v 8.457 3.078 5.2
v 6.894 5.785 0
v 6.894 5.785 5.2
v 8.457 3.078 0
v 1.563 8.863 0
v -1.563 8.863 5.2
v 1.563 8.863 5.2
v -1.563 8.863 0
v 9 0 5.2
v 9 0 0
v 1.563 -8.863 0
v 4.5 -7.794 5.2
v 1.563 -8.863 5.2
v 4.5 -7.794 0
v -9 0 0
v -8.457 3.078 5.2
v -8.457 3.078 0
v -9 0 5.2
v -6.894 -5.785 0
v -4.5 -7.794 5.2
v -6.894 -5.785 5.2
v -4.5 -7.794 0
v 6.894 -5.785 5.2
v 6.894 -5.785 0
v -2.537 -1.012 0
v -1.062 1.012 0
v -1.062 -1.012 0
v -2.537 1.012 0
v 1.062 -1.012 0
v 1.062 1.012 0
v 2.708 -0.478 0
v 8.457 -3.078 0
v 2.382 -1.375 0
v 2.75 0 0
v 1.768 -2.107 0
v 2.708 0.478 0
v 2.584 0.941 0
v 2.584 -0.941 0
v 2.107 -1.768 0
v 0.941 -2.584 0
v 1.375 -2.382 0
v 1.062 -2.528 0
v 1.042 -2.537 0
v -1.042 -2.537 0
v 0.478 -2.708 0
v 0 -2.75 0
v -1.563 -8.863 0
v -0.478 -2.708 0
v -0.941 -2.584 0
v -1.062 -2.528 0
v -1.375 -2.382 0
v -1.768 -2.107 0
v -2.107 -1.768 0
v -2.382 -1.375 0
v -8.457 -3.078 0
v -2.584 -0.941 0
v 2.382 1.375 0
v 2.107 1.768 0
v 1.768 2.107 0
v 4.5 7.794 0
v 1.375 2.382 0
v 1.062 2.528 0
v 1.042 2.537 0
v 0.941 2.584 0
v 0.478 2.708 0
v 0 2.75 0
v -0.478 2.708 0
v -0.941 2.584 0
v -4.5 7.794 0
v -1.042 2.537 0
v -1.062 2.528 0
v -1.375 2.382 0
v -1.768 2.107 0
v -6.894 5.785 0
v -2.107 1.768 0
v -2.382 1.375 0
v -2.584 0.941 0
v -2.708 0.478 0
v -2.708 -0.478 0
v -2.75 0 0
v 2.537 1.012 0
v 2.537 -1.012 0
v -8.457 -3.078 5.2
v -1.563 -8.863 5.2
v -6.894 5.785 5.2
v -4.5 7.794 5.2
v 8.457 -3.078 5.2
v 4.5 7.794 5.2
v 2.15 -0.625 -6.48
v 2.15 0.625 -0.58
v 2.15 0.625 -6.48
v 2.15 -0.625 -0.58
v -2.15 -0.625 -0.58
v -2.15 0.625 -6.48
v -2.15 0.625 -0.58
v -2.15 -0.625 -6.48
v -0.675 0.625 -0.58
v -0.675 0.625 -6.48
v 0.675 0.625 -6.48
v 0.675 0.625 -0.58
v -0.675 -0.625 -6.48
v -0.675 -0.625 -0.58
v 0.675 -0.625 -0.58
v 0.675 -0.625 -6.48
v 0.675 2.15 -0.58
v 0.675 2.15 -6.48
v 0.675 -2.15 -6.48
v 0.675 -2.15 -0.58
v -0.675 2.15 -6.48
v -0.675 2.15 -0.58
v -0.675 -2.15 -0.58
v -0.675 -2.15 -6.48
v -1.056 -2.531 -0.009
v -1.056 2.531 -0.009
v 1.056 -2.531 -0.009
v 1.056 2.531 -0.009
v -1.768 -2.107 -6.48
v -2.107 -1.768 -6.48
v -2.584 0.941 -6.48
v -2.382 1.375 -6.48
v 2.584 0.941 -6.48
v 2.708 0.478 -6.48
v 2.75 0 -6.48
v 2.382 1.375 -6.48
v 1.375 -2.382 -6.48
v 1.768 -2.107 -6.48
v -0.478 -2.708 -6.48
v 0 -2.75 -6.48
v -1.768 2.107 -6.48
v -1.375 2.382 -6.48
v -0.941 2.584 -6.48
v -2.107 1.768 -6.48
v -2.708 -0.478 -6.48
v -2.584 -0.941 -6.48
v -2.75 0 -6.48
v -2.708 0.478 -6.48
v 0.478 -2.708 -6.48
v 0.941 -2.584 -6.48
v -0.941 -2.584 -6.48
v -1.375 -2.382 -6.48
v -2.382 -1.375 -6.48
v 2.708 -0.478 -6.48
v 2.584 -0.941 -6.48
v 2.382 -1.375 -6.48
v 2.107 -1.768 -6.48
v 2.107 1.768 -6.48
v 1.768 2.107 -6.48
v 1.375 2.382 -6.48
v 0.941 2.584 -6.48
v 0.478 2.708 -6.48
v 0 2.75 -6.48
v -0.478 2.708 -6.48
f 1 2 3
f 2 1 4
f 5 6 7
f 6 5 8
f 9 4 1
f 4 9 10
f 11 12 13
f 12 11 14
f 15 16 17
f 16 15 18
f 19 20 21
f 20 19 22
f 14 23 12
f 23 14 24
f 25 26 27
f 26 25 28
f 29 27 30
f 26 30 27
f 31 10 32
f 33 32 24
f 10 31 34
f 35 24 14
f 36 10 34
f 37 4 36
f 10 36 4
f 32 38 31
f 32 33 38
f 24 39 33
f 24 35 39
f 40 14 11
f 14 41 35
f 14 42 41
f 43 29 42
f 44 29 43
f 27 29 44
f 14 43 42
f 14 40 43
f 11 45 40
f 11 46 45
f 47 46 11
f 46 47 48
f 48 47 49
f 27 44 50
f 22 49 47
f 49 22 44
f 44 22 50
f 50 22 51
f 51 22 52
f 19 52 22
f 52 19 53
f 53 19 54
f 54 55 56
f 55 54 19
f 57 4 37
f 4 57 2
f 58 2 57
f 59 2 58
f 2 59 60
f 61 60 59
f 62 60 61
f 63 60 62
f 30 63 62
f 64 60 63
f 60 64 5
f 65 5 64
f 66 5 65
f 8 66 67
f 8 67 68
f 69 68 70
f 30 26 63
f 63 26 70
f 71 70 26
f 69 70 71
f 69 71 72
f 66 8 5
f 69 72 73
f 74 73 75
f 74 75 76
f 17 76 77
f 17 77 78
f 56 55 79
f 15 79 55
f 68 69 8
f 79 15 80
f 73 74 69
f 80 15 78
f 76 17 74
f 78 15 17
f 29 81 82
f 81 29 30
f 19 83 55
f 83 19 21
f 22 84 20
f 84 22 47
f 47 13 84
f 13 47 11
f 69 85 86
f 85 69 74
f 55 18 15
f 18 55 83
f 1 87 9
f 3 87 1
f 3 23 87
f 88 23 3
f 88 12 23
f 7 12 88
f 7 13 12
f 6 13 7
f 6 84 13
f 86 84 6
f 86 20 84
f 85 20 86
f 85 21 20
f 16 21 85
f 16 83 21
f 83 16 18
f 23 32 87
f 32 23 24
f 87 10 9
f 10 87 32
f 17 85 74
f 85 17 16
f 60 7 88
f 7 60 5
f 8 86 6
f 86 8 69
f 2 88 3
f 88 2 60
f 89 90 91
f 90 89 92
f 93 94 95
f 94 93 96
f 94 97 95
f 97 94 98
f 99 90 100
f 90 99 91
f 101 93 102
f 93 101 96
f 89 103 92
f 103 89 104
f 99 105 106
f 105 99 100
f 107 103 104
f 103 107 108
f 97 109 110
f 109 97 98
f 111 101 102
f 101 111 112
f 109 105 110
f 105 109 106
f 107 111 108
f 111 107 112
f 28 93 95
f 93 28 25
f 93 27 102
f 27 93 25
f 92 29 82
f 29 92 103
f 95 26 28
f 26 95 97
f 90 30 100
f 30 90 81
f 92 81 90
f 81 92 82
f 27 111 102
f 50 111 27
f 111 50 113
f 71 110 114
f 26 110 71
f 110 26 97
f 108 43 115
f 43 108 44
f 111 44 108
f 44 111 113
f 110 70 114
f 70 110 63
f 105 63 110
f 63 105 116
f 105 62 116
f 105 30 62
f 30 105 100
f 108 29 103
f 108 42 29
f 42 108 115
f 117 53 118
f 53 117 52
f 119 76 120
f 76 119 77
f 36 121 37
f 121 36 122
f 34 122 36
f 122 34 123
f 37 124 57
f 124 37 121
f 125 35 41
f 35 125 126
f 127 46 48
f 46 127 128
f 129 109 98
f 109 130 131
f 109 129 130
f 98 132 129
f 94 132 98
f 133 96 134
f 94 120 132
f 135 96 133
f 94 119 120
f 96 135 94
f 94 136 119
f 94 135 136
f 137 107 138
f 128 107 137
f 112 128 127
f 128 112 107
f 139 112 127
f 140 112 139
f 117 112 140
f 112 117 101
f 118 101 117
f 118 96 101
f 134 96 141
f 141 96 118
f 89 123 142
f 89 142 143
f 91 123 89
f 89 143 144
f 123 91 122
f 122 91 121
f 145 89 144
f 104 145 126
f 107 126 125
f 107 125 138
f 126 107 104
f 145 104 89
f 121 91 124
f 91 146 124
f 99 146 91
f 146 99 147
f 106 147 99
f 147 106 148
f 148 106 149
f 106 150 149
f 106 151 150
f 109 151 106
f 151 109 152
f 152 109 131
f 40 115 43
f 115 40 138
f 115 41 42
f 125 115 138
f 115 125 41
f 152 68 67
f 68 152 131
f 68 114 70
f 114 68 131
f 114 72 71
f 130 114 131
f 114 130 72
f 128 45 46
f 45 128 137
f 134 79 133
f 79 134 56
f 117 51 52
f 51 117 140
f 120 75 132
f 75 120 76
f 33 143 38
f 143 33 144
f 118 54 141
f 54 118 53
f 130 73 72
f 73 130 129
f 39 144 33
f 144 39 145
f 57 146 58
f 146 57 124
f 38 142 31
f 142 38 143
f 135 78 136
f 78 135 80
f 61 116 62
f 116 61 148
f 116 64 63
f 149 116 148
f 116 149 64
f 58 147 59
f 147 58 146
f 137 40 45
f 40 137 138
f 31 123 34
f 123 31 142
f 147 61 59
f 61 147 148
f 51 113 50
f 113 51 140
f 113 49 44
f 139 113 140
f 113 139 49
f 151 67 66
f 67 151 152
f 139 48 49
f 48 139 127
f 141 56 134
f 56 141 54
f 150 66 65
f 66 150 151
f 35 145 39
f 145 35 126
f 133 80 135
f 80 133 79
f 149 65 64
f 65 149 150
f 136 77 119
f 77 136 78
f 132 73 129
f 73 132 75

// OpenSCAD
// file: ../modules/homing_bar.scad
function homing_bar_quality_steps(quality, preview_steps, export_steps) =
    quality == "preview" ? preview_steps : export_steps;

module homing_bar_profile(length, width, quality = "export") {
    end_steps = homing_bar_quality_steps(quality, 18, 32);
    cap_length = max(length, width);

    hull() {
        translate([-cap_length / 2 + width / 2, 0])
            circle(d = width, $fn = end_steps);
        translate([ cap_length / 2 - width / 2, 0])
            circle(d = width, $fn = end_steps);
    }
}

module homing_bar_blank(
    length,
    width,
    height,
    base_thickness,
    offset_y,
    base_z,
    quality = "export"
) {
    cap_height = max(height, 0.05);
    contact_height = max(base_thickness, 0.05);
    contact_length = length + contact_height * 1.6;
    contact_width = width + contact_height * 1.2;

    translate([0, offset_y, base_z])
        union() {
            hull() {
                linear_extrude(height = 0.01)
                    homing_bar_profile(contact_length, contact_width, quality);
                translate([0, 0, contact_height])
                    linear_extrude(height = 0.01)
                        homing_bar_profile(length, width, quality);
            }

            translate([0, 0, contact_height])
                linear_extrude(height = cap_height)
                    homing_bar_profile(length, width, quality);
        }
}
// file: ../modules/stem_alps.scad
function positive_alps_stem_dimension(value, minimum = 0.1) = max(value, minimum);

module alps_post(stem_length, stem_width, stem_height, lead_in) {
    safe_length = positive_alps_stem_dimension(stem_length);
    safe_width = positive_alps_stem_dimension(stem_width);
    safe_height = max(stem_height, 0.2);
    safe_lead_in = min(lead_in, safe_length * 0.2, safe_width * 0.3, safe_height * 0.4);

    hull() {
        linear_extrude(height = max(safe_height - safe_lead_in, 0.01))
            square([safe_length, safe_width], center = true);

        translate([0, 0, safe_height - 0.01])
            linear_extrude(height = 0.01)
                square([
                    positive_alps_stem_dimension(safe_length - safe_lead_in * 2),
                    positive_alps_stem_dimension(safe_width - safe_lead_in * 2)
                ], center = true);
    }
}

module stem_alps(
    stem_length = 4.45,
    stem_width = 2.25,
    stem_height = 3.5,
    base_clearance = 0,
    lead_in = 0.12,
    quality = "export"
) {
    translate([0, 0, base_clearance])
        alps_post(stem_length, stem_width, stem_height, lead_in);
}
// file: ../modules/stem_choc_v2.scad
use <stem_mx.scad>

module stem_choc_v2(
    outer_diameter = 5.5,
    stem_height = 6.5,
    base_clearance = 0,
    cross_width_horizontal = 1.25,
    cross_length_horizontal = 4.3,
    cross_width_vertical = 1.35,
    cross_length_vertical = 4.3,
    cross_chamfer = 0.4,
    chamfer_height = 0.6,
    quality = "export"
) {
    stem_mx(
        outer_diameter = outer_diameter,
        stem_height = stem_height,
        base_clearance = base_clearance,
        cross_width_horizontal = cross_width_horizontal,
        cross_length_horizontal = cross_length_horizontal,
        cross_width_vertical = cross_width_vertical,
        cross_length_vertical = cross_length_vertical,
        cross_chamfer = cross_chamfer,
        chamfer_height = chamfer_height,
        quality = quality
    );
}
// file: ../modules/stem_choc_v1.scad
function positive_choc_stem_dimension(value, minimum = 0.1) = max(value, minimum);

module choc_v1_prong(prong_width, prong_depth, prong_height, lead_in) {
    safe_width = positive_choc_stem_dimension(prong_width);
    safe_depth = positive_choc_stem_dimension(prong_depth);
    safe_height = max(prong_height, 0.2);
    safe_lead_in = min(lead_in, safe_width * 0.4, safe_depth * 0.2, safe_height * 0.4);

    hull() {
        linear_extrude(height = max(safe_height - safe_lead_in, 0.01))
            square([safe_width, safe_depth], center = true);

        translate([0, 0, safe_height - 0.01])
            linear_extrude(height = 0.01)
                square([
                    positive_choc_stem_dimension(safe_width - safe_lead_in * 2),
                    positive_choc_stem_dimension(safe_depth - safe_lead_in * 2)
                ], center = true);
    }
}

module stem_choc_v1(
    prong_width = 1.2,
    prong_depth = 3.0,
    prong_spacing = 5.7,
    stem_height = 3.0,
    base_clearance = 0,
    lead_in = 0.12,
    quality = "export"
) {
    for (offset_x = [prong_spacing / 2, -prong_spacing / 2]) {
        translate([offset_x, 0, base_clearance])
            choc_v1_prong(prong_width, prong_depth, stem_height, lead_in);
    }
}
// file: ../modules/stem_mx.scad
function stem_quality_steps(quality, preview_steps, export_steps) =
    quality == "preview" ? preview_steps : export_steps;

module stem_slot(length, width, height) {
    translate([-length / 2, -width / 2, 0])
        cube([length, width, height]);
}

module stem_mx(
    outer_diameter = 5.5,
    stem_height = 4.5,
    base_clearance = 0,
    cross_width_horizontal = 1.25,
    cross_length_horizontal = 4.3,
    cross_width_vertical = 1.35,
    cross_length_vertical = 4.3,
    cross_chamfer = 0.4,
    chamfer_height = 0.6,
    quality = "export"
) {
    outer_steps = stem_quality_steps(quality, 36, 64);
    safe_height = max(stem_height, 0.2);

    difference() {
        translate([0, 0, base_clearance])
            cylinder(d = outer_diameter, h = safe_height, $fn = outer_steps);

        translate([0, 0, base_clearance]) {
            stem_slot(cross_length_horizontal, cross_width_horizontal, safe_height + 1);
            stem_slot(cross_width_vertical, cross_length_vertical, safe_height + 1);
        }

        if (cross_chamfer > 0) {
            translate([0, 0, base_clearance - 0.01])
                hull() {
                    stem_slot(
                        cross_length_horizontal + cross_chamfer * 2,
                        cross_width_horizontal + cross_chamfer * 2,
                        0.01
                    );
                    translate([0, 0, chamfer_height])
                        stem_slot(cross_length_horizontal, cross_width_horizontal, 0.01);
                }

            translate([0, 0, base_clearance - 0.01])
                hull() {
                    stem_slot(
                        cross_width_vertical + cross_chamfer * 2,
                        cross_length_vertical + cross_chamfer * 2,
                        0.01
                    );
                    translate([0, 0, chamfer_height])
                        stem_slot(cross_width_vertical, cross_length_vertical, 0.01);
                }
        }
    }
}
// file: ../modules/legend_block.scad
function legend_quality_steps(quality, preview_steps, export_steps) =
    quality == "preview" ? preview_steps : export_steps;
function legend_text_curve_steps(quality = "export") =
    legend_quality_steps(quality, 48, 96);
function legend_text_internal_scale(quality = "export") =
    legend_quality_steps(quality, 6, 10);
// Keep legend size tied to the user's explicit control value without auto-fitting by label length.
function legend_text_size(depth) = max(depth, 0);

module legend_text_shape(label, size, font_name, curve_steps = 48) {
    text(
        text = label,
        size = size,
        font = font_name,
        halign = "center",
        valign = "center",
        $fn = curve_steps
    );
}

// Keep decoration options available across bundled fonts without requiring extra font files.
module legend_text_profile(
    label,
    size,
    font_name,
    outline_delta = 0,
    curve_steps = 48
) {
    if (abs(outline_delta) > 0.0001) {
        offset(delta = outline_delta)
            legend_text_shape(
                label = label,
                size = size,
                font_name = font_name,
                curve_steps = curve_steps
            );
    } else {
        legend_text_shape(
            label = label,
            size = size,
            font_name = font_name,
            curve_steps = curve_steps
        );
    }
}

module legend_block(
    label,
    width,
    depth,
    height,
    offset_x,
    offset_y,
    base_z,
    font_name = "M PLUS 1:style=Regular",
    underline_enabled = false,
    underline_width = 0,
    underline_thickness = 0,
    underline_offset_y = 0,
    outline_delta = 0,
    quality = "export"
) {
    if (!is_undef(label) && len(label) > 0) {
        size = legend_text_size(depth);
        curve_steps = legend_text_curve_steps(quality);
        internal_scale = legend_text_internal_scale(quality);

        translate([offset_x, offset_y, base_z])
            linear_extrude(height = height, center = false, convexity = 10)
                // Build glyph outlines at a larger internal scale so the bundled runtime
                // preserves more of the original font curvature before scaling back down.
                scale([1 / internal_scale, 1 / internal_scale, 1])
                    union() {
                        legend_text_profile(
                            label = label,
                            size = size * internal_scale,
                            font_name = font_name,
                            outline_delta = outline_delta * internal_scale,
                            curve_steps = curve_steps
                        );

                        if (underline_enabled && underline_width > 0 && underline_thickness > 0) {
                            translate([0, underline_offset_y * internal_scale])
                                square(
                                    [underline_width * internal_scale, underline_thickness * internal_scale],
                                    center = true
                                );
                        }
                    }
    }
}
// file: ../modules/keycap_typewriter.scad
use <keycap_shell.scad>

function typewriter_plan_corner_radius(width, depth, radius) =
    min(max(radius, 0), max(min(width, depth), 0.2) / 2);
function typewriter_is_axis_aligned(pitch_deg, roll_deg) =
    abs(pitch_deg) <= 0.001 && abs(roll_deg) <= 0.001;

module keycap_typewriter_plan_profile(
    width,
    depth,
    corner_radius,
    quality = "export"
) {
    rounded_rect_coords(
        -width / 2,
        width / 2,
        -depth / 2,
        depth / 2,
        typewriter_plan_corner_radius(width, depth, corner_radius),
        quality
    );
}

module keycap_typewriter_outer_shell(
    width,
    depth,
    top_center_height,
    corner_radius,
    pitch_deg = 0,
    roll_deg = 0,
    quality = "export"
) {
    safe_corner_radius = typewriter_plan_corner_radius(width, depth, corner_radius);

    hull() {
        keycap_base_face(
            -width / 2,
            width / 2,
            -depth / 2,
            depth / 2,
            safe_corner_radius,
            quality
        );

        keycap_top_face(
            -width / 2,
            width / 2,
            -depth / 2,
            depth / 2,
            safe_corner_radius,
            top_center_height,
            pitch_deg,
            roll_deg,
            quality
        );
    }
}

module keycap_typewriter_cap(
    width,
    depth,
    top_center_height,
    corner_radius = 9,
    dish_radius = 45,
    dish_depth = 0,
    pitch_deg = 0,
    roll_deg = 0,
    quality = "export"
) {
    difference() {
        if (typewriter_is_axis_aligned(pitch_deg, roll_deg)) {
            linear_extrude(height = top_center_height)
                keycap_typewriter_plan_profile(
                    width = width,
                    depth = depth,
                    corner_radius = corner_radius,
                    quality = quality
                );
        } else {
            keycap_typewriter_outer_shell(
                width = width,
                depth = depth,
                top_center_height = top_center_height,
                corner_radius = corner_radius,
                pitch_deg = pitch_deg,
                roll_deg = roll_deg,
                quality = quality
            );
        }

        keycap_dish_cut(
            top_center_height = top_center_height,
            dish_depth = dish_depth,
            dish_radius = dish_radius,
            quality = quality
        );
    }
}

module keycap_typewriter_shell(
    width,
    depth,
    top_center_height,
    wall,
    top_thickness = 1.2,
    corner_radius = 9,
    dish_radius = 45,
    dish_depth = 0,
    pitch_deg = 0,
    roll_deg = 0,
    quality = "export"
) {
    keycap_typewriter_cap(
        width = width,
        depth = depth,
        top_center_height = top_center_height,
        corner_radius = corner_radius,
        dish_radius = dish_radius,
        dish_depth = dish_depth,
        pitch_deg = pitch_deg,
        roll_deg = roll_deg,
        quality = quality
    );
}
// file: ../presets/stem-nominals.scad
stem_nominal_outer_diameter = 5.5;
legacy_stem_nominal_width = stem_nominal_outer_diameter;
legacy_stem_nominal_depth = stem_nominal_outer_diameter;
stem_nominal_height = 6.5;
stem_nominal_inset = 0;
stem_nominal_cross_width_horizontal = 1.25;
stem_nominal_cross_length_horizontal = 4.3;
stem_nominal_cross_width_vertical = 1.35;
stem_nominal_cross_length_vertical = 4.3;
stem_nominal_cross_chamfer = 0.4;

stem_mx_nominal_outer_diameter = 5.5;
stem_mx_nominal_height = 4.5;
stem_mx_nominal_inset = 0;
stem_mx_nominal_cross_width_horizontal = stem_nominal_cross_width_horizontal;
stem_mx_nominal_cross_length_horizontal = stem_nominal_cross_length_horizontal;
stem_mx_nominal_cross_width_vertical = stem_nominal_cross_width_vertical;
stem_mx_nominal_cross_length_vertical = stem_nominal_cross_length_vertical;
stem_mx_nominal_cross_chamfer = stem_nominal_cross_chamfer;

stem_choc_v2_nominal_outer_diameter = stem_nominal_outer_diameter;
stem_choc_v2_nominal_height = stem_nominal_height;
stem_choc_v2_nominal_inset = stem_nominal_inset;
stem_choc_v2_nominal_cross_width_horizontal = stem_nominal_cross_width_horizontal;
stem_choc_v2_nominal_cross_length_horizontal = stem_nominal_cross_length_horizontal;
stem_choc_v2_nominal_cross_width_vertical = stem_nominal_cross_width_vertical;
stem_choc_v2_nominal_cross_length_vertical = stem_nominal_cross_length_vertical;
stem_choc_v2_nominal_cross_chamfer = stem_nominal_cross_chamfer;

stem_choc_v1_nominal_height = 3.0;
stem_choc_v1_nominal_inset = 0;
stem_choc_v1_nominal_prong_width = 1.2;
stem_choc_v1_nominal_prong_depth = 3.0;
stem_choc_v1_nominal_prong_spacing = 5.7;
stem_choc_v1_nominal_lead_in = 0.12;

stem_alps_nominal_height = 3.5;
stem_alps_nominal_inset = 0;
stem_alps_nominal_length = 4.45;
stem_alps_nominal_width = 2.25;
stem_alps_nominal_lead_in = 0.12;
// file: common/typewriter-params.scad
user_shape_geometry_type = "typewriter";
user_key_width = 18;
user_key_depth = 18;
user_top_center_height = 5.2;
user_wall_thickness = 1.1;
user_top_scale = 1;
user_typewriter_corner_radius = 9;
user_profile_front_angle = 0;
user_profile_back_angle = 0;
user_profile_left_angle = 0;
user_profile_right_angle = 0;
user_top_thickness = 1.2;
user_bottom_corner_radius = 0;
user_top_corner_radius = 0;
user_dish_radius = 45;
user_dish_depth = 0;
user_top_pitch_deg = 0;
user_top_roll_deg = 0;

user_legend_enabled = true;
user_legend_text = "A";
user_legend_font_name = "M PLUS 1:style=Regular";
user_legend_underline_enabled = false;
user_legend_underline_width = 0;
user_legend_underline_thickness = 0;
user_legend_underline_offset_y = 0;
user_legend_width = 7.2;
user_legend_depth = 4.0;
user_legend_height = 0;
user_legend_embed = 0.6;
user_legend_outline_delta = 0;
user_legend_offset_x = 0;
user_legend_offset_y = 0;

user_homing_bar_enabled = false;
user_homing_bar_height = 0.6;
user_homing_bar_length = 4.0;
user_homing_bar_width = 1.58;
user_homing_bar_offset_y = -3.5;
user_homing_bar_base_thickness = 0.35;

user_stem_type = "choc_v2";
user_stem_enabled = true;
user_stem_outer_delta = 0;
user_stem_cross_margin = 0;
user_stem_inset_delta = 0;
// main file
export_target = "preview";

include <common/typewriter-params.scad>

user_shape_geometry_type = "typewriter";
user_key_width = 18;
user_key_depth = 18;
user_top_center_height = 5.2;
user_top_pitch_deg = 0;
user_top_roll_deg = 0;
user_wall_thickness = 1.1;
user_top_scale = 1;
user_typewriter_corner_radius = 9;
user_dish_radius = 45;
user_dish_depth = 0;

user_legend_enabled = true;
user_legend_text = "A";
user_legend_font_name = "M PLUS 1:style=Regular";
user_legend_underline_enabled = false;
user_legend_width = 7.2;
user_legend_depth = 4.0;
user_legend_height = 0;
user_legend_embed = 0.6;
user_legend_outline_delta = 0;

user_homing_bar_enabled = false;

user_stem_type = "choc_v2";
user_stem_outer_delta = 0;
user_stem_cross_margin = 0;
user_stem_inset_delta = 0;

include <../base/keycap.scad>
